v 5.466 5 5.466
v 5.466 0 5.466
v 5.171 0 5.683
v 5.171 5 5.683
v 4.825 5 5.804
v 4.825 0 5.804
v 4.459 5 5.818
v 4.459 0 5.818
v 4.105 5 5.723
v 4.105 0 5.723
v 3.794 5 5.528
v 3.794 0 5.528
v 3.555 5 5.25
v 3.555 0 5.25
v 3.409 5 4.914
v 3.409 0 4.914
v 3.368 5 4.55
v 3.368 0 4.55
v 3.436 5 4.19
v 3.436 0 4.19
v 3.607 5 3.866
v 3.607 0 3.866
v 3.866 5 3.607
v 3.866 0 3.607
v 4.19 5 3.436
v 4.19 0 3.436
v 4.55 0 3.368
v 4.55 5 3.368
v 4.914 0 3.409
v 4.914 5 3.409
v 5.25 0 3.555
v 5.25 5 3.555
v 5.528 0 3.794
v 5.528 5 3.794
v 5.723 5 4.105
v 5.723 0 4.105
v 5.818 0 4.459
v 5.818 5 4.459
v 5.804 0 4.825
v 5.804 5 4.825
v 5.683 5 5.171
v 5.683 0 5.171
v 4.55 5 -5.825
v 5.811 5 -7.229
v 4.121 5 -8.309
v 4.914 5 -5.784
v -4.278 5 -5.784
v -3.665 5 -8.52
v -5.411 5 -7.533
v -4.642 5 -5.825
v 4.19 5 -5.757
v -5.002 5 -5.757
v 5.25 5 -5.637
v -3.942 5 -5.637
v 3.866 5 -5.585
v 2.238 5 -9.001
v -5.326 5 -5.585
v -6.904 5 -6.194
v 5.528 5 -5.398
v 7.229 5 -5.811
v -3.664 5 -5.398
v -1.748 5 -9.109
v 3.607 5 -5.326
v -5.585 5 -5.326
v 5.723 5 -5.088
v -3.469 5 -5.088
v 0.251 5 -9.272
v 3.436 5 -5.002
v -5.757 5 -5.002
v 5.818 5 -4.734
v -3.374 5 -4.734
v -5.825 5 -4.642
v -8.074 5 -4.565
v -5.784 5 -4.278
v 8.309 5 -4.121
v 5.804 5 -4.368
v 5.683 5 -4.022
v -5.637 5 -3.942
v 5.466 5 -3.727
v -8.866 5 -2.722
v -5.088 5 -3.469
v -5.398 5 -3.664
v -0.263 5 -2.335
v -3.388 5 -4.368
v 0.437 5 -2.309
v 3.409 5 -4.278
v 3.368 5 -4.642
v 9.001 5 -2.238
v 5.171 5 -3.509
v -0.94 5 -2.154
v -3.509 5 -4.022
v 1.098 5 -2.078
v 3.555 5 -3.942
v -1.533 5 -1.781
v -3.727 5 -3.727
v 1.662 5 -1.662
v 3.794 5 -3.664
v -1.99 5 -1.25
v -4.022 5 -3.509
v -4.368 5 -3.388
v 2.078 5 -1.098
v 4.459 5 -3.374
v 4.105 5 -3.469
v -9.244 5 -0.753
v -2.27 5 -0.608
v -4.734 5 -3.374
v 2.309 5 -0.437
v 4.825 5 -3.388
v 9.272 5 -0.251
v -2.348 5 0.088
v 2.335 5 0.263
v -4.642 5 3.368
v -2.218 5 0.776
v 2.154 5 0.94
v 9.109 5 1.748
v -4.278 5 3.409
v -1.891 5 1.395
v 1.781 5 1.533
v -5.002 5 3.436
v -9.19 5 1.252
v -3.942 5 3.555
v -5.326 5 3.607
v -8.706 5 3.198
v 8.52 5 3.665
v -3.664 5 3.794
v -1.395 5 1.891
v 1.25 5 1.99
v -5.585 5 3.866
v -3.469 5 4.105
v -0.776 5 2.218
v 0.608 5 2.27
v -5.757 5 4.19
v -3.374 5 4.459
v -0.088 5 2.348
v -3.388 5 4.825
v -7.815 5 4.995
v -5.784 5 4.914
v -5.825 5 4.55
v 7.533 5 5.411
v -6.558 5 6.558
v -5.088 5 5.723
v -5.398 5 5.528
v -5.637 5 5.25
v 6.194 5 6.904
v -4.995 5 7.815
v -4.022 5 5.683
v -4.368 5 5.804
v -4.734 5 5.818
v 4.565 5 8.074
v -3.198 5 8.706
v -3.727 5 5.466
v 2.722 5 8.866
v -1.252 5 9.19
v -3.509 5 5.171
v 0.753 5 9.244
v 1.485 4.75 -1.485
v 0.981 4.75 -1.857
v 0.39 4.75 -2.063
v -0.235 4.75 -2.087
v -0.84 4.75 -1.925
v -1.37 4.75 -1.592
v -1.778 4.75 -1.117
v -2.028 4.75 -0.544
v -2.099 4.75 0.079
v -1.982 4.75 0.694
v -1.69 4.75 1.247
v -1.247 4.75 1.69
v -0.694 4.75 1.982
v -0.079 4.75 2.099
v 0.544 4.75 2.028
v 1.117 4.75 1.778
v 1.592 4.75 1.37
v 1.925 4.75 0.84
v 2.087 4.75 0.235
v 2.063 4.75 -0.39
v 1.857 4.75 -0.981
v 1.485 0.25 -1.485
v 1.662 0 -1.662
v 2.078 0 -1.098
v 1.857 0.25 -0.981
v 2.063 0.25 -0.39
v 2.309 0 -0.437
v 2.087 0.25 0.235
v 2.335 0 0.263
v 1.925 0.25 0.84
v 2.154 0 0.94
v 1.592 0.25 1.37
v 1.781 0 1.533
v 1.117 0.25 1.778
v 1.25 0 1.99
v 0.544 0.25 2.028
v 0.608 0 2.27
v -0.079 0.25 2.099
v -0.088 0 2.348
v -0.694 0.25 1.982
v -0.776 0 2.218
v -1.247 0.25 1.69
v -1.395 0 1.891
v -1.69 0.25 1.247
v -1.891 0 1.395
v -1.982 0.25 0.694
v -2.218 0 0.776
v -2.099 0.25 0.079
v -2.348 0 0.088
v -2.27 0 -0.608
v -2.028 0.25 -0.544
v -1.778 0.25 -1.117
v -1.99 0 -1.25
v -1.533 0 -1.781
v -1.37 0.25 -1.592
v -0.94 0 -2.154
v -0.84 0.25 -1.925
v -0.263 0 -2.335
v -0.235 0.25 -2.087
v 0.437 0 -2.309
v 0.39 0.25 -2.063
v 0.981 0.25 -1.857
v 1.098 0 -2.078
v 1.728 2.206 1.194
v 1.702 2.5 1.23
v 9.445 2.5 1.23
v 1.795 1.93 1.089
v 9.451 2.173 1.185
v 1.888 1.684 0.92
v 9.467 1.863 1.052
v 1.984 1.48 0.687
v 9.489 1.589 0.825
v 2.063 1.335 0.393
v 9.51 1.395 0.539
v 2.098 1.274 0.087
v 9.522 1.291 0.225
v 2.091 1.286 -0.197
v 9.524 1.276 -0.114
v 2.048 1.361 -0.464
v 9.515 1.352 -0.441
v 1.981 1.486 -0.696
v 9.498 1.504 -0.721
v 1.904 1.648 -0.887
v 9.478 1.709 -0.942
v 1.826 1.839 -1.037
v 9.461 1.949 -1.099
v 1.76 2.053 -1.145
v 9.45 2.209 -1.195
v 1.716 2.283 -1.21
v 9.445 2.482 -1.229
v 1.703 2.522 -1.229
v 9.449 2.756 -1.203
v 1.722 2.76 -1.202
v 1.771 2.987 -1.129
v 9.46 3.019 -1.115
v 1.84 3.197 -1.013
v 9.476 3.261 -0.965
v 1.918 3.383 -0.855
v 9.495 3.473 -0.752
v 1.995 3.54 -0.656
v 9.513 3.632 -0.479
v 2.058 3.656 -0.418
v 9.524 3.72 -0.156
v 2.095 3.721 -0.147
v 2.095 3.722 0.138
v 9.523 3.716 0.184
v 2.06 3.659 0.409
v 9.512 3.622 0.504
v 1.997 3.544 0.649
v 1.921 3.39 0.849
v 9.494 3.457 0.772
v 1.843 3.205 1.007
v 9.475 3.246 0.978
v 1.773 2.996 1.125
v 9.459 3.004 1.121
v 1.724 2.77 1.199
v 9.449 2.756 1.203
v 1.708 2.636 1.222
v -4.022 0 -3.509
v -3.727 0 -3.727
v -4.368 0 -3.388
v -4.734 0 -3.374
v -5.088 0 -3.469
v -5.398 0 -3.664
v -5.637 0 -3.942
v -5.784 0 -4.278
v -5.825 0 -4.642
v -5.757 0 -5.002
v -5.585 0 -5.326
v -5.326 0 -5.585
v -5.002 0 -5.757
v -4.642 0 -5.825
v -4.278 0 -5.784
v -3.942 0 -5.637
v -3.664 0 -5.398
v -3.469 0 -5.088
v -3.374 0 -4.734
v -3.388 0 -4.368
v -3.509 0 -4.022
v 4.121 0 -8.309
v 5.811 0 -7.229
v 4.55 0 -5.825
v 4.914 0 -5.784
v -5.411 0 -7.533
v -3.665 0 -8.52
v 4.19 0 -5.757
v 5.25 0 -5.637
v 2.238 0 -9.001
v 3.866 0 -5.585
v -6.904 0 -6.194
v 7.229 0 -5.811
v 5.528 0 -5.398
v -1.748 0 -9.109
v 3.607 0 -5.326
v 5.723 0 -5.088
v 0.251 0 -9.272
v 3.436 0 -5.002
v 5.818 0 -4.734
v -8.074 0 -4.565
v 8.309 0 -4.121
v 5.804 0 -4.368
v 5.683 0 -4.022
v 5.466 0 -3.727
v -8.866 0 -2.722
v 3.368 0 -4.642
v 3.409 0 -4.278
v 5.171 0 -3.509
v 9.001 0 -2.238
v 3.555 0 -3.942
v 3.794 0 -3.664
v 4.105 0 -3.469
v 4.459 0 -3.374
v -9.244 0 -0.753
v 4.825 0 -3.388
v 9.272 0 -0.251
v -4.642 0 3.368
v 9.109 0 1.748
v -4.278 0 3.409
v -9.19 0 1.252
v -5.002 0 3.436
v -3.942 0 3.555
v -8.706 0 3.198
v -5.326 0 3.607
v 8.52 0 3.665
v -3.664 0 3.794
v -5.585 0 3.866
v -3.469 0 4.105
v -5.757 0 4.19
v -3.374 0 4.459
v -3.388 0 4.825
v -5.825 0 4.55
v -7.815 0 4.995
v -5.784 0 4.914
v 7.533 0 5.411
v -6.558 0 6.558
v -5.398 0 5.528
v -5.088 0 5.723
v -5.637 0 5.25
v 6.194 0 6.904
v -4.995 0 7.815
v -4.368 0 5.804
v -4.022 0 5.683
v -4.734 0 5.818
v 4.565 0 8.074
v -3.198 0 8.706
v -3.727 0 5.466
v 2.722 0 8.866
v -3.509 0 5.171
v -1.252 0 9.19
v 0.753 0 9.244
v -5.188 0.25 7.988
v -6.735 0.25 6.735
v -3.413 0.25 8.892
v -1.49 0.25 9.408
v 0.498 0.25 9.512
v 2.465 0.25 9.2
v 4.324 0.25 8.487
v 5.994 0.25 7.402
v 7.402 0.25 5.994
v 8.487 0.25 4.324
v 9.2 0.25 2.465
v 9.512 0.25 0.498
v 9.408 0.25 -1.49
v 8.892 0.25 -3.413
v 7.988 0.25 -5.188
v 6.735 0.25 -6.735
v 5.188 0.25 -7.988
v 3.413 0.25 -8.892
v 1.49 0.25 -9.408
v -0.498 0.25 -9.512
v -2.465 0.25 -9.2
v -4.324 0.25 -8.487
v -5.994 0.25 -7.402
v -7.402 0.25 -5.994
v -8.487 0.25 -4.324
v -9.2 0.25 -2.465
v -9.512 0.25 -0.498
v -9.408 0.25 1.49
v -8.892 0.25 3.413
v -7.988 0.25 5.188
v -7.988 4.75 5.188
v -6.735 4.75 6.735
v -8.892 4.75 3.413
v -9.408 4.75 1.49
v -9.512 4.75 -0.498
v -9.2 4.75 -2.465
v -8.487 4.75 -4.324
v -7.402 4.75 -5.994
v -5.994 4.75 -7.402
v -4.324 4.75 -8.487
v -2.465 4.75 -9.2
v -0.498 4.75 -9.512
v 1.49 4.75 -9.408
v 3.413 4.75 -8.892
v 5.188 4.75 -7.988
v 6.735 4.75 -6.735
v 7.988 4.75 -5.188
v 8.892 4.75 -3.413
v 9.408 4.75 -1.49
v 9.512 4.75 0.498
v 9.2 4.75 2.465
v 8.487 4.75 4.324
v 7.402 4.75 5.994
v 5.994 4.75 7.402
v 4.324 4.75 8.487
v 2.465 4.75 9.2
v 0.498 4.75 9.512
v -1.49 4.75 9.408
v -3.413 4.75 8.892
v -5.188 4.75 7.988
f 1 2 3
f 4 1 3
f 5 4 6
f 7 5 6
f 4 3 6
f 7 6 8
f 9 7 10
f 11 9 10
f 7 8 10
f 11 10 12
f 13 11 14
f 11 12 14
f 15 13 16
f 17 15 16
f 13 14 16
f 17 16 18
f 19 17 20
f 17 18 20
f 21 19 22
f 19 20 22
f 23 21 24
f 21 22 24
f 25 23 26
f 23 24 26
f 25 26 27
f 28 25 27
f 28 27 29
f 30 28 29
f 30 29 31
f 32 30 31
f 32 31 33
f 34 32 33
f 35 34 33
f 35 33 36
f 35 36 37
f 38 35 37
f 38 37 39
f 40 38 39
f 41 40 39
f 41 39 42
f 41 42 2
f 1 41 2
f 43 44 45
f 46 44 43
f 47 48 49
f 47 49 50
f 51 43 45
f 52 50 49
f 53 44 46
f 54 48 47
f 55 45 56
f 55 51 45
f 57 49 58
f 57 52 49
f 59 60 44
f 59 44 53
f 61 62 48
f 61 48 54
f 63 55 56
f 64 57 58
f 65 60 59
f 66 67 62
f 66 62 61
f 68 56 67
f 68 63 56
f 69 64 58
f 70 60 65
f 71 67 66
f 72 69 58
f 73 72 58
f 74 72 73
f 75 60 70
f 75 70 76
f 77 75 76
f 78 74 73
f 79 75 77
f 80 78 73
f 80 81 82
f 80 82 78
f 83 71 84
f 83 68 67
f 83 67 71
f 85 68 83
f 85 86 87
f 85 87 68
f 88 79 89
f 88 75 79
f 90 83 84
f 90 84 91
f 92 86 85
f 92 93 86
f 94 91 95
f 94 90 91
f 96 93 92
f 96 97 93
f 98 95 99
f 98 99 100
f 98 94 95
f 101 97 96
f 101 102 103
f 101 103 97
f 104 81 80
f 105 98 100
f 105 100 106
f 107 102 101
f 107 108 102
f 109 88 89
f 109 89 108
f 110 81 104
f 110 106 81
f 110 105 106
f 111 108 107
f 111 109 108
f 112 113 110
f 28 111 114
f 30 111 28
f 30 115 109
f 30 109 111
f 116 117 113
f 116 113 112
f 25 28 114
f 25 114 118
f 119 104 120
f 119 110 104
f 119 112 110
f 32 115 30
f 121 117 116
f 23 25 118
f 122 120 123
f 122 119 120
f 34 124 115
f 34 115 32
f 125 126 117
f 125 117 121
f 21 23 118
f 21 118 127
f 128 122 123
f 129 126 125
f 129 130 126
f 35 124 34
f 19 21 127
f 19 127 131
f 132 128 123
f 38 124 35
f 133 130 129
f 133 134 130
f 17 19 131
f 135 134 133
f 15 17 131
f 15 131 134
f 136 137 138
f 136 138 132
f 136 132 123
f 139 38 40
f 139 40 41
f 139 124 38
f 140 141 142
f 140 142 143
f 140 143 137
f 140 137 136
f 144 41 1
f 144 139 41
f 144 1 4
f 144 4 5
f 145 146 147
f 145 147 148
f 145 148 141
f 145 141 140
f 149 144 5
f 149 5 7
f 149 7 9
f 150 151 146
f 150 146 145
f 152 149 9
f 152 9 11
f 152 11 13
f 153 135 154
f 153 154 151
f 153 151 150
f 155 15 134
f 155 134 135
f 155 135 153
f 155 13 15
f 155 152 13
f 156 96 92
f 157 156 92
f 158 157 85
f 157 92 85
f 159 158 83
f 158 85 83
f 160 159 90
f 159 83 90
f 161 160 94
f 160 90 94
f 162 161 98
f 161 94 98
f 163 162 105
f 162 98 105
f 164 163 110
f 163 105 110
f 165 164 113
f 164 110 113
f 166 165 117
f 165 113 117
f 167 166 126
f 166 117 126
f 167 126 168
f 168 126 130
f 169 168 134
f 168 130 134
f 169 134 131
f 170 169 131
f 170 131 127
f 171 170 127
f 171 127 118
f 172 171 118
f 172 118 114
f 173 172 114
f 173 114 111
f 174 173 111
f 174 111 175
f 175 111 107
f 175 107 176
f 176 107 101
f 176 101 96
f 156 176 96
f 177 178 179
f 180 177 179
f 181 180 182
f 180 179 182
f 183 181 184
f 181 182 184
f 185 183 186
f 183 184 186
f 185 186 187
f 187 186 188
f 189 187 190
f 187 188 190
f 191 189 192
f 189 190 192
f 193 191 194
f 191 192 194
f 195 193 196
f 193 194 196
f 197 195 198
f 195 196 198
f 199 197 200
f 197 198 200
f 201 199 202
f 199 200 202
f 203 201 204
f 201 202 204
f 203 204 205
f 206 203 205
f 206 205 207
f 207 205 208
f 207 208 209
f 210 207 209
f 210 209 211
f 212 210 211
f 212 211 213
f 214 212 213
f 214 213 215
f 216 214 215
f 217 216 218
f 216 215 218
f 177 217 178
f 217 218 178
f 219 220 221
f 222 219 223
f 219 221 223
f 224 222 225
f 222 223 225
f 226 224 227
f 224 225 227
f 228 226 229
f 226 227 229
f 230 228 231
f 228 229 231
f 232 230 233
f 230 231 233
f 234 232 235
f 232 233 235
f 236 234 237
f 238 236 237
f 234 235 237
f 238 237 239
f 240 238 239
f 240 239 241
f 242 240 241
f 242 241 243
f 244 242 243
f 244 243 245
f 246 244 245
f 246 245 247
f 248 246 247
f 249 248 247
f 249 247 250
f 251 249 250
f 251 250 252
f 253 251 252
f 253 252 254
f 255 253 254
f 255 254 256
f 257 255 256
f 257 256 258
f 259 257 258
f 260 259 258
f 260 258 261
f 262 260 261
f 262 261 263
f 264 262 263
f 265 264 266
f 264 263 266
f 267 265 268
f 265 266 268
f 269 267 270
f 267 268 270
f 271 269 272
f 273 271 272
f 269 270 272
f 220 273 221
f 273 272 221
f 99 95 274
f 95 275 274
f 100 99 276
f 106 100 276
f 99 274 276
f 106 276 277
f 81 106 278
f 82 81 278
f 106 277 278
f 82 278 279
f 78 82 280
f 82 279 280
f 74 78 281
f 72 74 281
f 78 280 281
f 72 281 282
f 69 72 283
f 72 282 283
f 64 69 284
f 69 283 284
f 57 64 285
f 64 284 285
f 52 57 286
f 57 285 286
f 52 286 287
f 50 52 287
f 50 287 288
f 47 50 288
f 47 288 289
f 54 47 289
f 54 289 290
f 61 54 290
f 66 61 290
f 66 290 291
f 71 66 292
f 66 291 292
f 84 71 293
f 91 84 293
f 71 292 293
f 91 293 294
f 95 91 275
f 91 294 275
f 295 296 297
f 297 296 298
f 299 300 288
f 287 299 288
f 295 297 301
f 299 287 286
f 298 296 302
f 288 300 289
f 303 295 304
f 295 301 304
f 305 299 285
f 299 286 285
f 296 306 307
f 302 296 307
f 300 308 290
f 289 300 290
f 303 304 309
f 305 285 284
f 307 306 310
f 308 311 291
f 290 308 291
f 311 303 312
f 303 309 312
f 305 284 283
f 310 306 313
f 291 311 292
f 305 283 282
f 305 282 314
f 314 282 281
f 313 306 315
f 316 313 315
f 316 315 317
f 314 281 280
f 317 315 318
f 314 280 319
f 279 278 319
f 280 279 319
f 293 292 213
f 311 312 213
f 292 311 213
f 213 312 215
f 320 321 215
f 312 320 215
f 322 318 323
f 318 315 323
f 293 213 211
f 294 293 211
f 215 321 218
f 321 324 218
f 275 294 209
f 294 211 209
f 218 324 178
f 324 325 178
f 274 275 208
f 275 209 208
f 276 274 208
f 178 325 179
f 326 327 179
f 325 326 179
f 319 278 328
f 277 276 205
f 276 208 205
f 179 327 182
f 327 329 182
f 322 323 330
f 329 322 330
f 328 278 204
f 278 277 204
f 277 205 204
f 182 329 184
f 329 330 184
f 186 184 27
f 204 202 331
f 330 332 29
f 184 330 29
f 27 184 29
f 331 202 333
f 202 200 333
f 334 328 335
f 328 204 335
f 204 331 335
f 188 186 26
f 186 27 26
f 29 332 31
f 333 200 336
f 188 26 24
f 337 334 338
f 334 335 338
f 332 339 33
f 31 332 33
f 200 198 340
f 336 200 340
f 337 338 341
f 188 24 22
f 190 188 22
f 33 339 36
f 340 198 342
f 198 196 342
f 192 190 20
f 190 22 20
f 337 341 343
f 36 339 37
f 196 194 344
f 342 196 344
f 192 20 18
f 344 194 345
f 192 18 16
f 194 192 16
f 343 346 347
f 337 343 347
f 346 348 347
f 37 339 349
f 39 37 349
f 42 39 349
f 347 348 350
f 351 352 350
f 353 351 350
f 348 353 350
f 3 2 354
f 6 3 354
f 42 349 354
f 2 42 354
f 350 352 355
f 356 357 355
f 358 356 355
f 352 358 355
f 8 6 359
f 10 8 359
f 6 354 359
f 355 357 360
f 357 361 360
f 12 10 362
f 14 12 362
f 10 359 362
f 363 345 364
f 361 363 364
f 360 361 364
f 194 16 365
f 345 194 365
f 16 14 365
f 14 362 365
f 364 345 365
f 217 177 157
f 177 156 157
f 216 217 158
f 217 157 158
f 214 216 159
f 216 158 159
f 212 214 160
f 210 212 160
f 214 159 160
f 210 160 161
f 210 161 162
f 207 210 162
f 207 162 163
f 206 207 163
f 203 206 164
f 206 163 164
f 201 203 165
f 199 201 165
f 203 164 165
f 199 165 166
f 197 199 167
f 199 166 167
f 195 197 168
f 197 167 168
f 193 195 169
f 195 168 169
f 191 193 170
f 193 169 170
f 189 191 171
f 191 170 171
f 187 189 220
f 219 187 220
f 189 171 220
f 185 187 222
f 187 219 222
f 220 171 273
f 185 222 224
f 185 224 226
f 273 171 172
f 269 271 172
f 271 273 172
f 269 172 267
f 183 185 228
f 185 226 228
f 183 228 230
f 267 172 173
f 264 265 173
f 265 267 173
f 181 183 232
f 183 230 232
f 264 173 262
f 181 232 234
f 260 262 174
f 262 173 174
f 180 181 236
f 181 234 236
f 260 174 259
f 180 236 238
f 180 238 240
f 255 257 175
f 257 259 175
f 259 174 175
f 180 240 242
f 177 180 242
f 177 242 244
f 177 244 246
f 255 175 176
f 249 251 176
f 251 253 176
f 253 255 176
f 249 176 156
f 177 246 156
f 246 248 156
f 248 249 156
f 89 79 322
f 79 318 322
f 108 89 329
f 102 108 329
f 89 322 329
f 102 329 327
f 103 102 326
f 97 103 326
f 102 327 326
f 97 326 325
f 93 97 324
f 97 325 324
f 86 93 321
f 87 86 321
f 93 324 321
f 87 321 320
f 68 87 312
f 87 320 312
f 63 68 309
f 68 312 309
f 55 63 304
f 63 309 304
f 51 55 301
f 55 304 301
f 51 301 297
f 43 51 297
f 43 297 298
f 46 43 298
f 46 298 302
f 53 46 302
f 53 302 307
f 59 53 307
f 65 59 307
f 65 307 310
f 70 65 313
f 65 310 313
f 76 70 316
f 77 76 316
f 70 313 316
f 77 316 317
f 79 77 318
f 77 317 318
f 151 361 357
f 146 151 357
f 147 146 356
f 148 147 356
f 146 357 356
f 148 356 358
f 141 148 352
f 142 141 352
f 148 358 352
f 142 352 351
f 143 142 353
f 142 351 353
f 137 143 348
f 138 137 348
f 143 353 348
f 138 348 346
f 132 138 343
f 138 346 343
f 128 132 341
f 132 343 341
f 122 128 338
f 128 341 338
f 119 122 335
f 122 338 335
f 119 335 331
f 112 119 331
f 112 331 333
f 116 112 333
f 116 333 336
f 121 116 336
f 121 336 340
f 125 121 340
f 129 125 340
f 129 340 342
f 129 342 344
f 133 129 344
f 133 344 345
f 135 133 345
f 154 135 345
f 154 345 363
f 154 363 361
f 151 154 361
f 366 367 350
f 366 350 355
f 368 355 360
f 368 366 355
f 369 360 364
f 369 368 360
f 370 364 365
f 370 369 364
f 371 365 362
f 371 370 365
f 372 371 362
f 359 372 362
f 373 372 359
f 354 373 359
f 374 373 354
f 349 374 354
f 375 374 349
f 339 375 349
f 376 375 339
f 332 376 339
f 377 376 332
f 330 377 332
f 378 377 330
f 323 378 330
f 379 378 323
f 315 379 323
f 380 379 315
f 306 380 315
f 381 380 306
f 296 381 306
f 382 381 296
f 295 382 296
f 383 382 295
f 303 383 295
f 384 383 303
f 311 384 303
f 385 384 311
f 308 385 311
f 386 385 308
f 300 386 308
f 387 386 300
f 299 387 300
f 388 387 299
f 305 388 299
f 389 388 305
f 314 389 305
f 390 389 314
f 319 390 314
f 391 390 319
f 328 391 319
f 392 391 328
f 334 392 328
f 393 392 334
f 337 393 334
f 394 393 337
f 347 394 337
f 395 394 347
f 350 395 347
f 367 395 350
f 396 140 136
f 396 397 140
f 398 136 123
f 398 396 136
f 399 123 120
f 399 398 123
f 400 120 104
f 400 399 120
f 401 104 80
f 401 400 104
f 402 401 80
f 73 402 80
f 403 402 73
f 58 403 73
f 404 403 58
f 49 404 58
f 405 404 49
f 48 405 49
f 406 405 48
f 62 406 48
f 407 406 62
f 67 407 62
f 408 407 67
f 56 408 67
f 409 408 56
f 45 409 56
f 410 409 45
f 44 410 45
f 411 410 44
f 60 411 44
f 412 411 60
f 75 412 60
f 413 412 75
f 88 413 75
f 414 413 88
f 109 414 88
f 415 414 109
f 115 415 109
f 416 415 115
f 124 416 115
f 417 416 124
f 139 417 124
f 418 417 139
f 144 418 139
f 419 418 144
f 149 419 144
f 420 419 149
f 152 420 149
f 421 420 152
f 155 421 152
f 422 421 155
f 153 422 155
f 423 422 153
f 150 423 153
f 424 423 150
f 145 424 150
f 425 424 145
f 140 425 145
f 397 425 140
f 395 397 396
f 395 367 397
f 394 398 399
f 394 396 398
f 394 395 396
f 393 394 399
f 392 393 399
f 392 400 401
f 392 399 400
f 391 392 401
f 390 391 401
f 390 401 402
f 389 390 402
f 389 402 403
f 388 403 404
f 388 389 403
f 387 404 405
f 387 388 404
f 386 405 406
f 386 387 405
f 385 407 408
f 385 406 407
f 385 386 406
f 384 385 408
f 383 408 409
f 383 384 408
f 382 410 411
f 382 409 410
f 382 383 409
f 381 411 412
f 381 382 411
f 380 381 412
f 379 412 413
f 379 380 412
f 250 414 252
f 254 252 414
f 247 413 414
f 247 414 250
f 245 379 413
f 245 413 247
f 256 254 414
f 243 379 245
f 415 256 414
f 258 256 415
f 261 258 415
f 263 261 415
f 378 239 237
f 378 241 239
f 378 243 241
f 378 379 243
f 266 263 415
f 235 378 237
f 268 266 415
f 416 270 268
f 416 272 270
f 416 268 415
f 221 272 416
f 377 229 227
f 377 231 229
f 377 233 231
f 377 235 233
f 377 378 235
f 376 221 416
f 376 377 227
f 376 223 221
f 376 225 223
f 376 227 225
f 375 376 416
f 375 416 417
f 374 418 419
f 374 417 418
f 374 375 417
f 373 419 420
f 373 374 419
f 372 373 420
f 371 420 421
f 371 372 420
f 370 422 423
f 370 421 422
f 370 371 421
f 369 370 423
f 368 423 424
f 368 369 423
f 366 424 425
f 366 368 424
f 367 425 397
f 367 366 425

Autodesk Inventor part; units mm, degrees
ref_plane "YZ Plane" through (0, 0, 0) normal (1, 0, 0) x (0, 1, 0)
ref_plane "XZ Plane" through (0, 0, 0) normal (0, 1, 0) x (-1, 0, 0)
ref_plane "XY Plane" through (0, 0, 0) normal (0, 0, 1) x (1, 0, 0)
sketch "Sketch1" plane through (0, 0, 0) normal (0, 1, 0) x (-1, 0, 0)
  circle A0 centre (0, 0) radius 9.525
  dimension "d0" = 19.05
extrude "Extrusion1" add sketch "Sketch1" along normal blind 5
sketch "Sketch2" plane through (0, 5, 0) normal (0, 1, 0) x (1, 0, 0)
  line L0 (0, 0) -> (0, 6.5)
  point P0 (-6.5, 0)
  point P1 (0, -6.5)
  point P2 (6.5, 0)
  dimension "d3" = 6.5
  dimension "d6" = 360
hole "Hole1" at (0, 5, -6.5) at (0, 5, 6.5) at (-6.5, 5, 0) at (6.5, 5, 0) direction (0, -1, 0) diameter 2.459 end through all thread size "M3x0.5" class "6H" standard "ISO Metric profile"
sketch "Sketch3" plane through (0, 5, 0) normal (0, 1, 0) x (1, 0, 0)
  circle A0 centre (0, 0) radius 2.1
  dimension "d15" = 4.2
extrude "Extrusion2" cut sketch "Sketch3" against normal through all
chamfer "Chamfer1" distance 0.25 angle 45 4 edges at (-2.1, 5, 0) (9.525, 5, 0) (9.525, 0, 0) (-2.1, 0, 0)
move or copy body "Move Body1" bodies to move or copy 1 copy no rotation origin (0, 0, 0) rotation axis (0, 1, 0) rotation angle 45
sketch "Sketch4" plane through (0, 0, 0) normal (1, 0, 0) x (0, 1, 0)
  line L0 (0, 0) -> (2.5, 0)
  dimension "d22" = 2.5
hole "Hole2" at (0, 2.5, 0) direction (1, 0, 0) diameter 2.459 end through all thread size "M3x0.5" class "6H" standard "ISO Metric profile"
properties part number "pololu-mounting-hub"
